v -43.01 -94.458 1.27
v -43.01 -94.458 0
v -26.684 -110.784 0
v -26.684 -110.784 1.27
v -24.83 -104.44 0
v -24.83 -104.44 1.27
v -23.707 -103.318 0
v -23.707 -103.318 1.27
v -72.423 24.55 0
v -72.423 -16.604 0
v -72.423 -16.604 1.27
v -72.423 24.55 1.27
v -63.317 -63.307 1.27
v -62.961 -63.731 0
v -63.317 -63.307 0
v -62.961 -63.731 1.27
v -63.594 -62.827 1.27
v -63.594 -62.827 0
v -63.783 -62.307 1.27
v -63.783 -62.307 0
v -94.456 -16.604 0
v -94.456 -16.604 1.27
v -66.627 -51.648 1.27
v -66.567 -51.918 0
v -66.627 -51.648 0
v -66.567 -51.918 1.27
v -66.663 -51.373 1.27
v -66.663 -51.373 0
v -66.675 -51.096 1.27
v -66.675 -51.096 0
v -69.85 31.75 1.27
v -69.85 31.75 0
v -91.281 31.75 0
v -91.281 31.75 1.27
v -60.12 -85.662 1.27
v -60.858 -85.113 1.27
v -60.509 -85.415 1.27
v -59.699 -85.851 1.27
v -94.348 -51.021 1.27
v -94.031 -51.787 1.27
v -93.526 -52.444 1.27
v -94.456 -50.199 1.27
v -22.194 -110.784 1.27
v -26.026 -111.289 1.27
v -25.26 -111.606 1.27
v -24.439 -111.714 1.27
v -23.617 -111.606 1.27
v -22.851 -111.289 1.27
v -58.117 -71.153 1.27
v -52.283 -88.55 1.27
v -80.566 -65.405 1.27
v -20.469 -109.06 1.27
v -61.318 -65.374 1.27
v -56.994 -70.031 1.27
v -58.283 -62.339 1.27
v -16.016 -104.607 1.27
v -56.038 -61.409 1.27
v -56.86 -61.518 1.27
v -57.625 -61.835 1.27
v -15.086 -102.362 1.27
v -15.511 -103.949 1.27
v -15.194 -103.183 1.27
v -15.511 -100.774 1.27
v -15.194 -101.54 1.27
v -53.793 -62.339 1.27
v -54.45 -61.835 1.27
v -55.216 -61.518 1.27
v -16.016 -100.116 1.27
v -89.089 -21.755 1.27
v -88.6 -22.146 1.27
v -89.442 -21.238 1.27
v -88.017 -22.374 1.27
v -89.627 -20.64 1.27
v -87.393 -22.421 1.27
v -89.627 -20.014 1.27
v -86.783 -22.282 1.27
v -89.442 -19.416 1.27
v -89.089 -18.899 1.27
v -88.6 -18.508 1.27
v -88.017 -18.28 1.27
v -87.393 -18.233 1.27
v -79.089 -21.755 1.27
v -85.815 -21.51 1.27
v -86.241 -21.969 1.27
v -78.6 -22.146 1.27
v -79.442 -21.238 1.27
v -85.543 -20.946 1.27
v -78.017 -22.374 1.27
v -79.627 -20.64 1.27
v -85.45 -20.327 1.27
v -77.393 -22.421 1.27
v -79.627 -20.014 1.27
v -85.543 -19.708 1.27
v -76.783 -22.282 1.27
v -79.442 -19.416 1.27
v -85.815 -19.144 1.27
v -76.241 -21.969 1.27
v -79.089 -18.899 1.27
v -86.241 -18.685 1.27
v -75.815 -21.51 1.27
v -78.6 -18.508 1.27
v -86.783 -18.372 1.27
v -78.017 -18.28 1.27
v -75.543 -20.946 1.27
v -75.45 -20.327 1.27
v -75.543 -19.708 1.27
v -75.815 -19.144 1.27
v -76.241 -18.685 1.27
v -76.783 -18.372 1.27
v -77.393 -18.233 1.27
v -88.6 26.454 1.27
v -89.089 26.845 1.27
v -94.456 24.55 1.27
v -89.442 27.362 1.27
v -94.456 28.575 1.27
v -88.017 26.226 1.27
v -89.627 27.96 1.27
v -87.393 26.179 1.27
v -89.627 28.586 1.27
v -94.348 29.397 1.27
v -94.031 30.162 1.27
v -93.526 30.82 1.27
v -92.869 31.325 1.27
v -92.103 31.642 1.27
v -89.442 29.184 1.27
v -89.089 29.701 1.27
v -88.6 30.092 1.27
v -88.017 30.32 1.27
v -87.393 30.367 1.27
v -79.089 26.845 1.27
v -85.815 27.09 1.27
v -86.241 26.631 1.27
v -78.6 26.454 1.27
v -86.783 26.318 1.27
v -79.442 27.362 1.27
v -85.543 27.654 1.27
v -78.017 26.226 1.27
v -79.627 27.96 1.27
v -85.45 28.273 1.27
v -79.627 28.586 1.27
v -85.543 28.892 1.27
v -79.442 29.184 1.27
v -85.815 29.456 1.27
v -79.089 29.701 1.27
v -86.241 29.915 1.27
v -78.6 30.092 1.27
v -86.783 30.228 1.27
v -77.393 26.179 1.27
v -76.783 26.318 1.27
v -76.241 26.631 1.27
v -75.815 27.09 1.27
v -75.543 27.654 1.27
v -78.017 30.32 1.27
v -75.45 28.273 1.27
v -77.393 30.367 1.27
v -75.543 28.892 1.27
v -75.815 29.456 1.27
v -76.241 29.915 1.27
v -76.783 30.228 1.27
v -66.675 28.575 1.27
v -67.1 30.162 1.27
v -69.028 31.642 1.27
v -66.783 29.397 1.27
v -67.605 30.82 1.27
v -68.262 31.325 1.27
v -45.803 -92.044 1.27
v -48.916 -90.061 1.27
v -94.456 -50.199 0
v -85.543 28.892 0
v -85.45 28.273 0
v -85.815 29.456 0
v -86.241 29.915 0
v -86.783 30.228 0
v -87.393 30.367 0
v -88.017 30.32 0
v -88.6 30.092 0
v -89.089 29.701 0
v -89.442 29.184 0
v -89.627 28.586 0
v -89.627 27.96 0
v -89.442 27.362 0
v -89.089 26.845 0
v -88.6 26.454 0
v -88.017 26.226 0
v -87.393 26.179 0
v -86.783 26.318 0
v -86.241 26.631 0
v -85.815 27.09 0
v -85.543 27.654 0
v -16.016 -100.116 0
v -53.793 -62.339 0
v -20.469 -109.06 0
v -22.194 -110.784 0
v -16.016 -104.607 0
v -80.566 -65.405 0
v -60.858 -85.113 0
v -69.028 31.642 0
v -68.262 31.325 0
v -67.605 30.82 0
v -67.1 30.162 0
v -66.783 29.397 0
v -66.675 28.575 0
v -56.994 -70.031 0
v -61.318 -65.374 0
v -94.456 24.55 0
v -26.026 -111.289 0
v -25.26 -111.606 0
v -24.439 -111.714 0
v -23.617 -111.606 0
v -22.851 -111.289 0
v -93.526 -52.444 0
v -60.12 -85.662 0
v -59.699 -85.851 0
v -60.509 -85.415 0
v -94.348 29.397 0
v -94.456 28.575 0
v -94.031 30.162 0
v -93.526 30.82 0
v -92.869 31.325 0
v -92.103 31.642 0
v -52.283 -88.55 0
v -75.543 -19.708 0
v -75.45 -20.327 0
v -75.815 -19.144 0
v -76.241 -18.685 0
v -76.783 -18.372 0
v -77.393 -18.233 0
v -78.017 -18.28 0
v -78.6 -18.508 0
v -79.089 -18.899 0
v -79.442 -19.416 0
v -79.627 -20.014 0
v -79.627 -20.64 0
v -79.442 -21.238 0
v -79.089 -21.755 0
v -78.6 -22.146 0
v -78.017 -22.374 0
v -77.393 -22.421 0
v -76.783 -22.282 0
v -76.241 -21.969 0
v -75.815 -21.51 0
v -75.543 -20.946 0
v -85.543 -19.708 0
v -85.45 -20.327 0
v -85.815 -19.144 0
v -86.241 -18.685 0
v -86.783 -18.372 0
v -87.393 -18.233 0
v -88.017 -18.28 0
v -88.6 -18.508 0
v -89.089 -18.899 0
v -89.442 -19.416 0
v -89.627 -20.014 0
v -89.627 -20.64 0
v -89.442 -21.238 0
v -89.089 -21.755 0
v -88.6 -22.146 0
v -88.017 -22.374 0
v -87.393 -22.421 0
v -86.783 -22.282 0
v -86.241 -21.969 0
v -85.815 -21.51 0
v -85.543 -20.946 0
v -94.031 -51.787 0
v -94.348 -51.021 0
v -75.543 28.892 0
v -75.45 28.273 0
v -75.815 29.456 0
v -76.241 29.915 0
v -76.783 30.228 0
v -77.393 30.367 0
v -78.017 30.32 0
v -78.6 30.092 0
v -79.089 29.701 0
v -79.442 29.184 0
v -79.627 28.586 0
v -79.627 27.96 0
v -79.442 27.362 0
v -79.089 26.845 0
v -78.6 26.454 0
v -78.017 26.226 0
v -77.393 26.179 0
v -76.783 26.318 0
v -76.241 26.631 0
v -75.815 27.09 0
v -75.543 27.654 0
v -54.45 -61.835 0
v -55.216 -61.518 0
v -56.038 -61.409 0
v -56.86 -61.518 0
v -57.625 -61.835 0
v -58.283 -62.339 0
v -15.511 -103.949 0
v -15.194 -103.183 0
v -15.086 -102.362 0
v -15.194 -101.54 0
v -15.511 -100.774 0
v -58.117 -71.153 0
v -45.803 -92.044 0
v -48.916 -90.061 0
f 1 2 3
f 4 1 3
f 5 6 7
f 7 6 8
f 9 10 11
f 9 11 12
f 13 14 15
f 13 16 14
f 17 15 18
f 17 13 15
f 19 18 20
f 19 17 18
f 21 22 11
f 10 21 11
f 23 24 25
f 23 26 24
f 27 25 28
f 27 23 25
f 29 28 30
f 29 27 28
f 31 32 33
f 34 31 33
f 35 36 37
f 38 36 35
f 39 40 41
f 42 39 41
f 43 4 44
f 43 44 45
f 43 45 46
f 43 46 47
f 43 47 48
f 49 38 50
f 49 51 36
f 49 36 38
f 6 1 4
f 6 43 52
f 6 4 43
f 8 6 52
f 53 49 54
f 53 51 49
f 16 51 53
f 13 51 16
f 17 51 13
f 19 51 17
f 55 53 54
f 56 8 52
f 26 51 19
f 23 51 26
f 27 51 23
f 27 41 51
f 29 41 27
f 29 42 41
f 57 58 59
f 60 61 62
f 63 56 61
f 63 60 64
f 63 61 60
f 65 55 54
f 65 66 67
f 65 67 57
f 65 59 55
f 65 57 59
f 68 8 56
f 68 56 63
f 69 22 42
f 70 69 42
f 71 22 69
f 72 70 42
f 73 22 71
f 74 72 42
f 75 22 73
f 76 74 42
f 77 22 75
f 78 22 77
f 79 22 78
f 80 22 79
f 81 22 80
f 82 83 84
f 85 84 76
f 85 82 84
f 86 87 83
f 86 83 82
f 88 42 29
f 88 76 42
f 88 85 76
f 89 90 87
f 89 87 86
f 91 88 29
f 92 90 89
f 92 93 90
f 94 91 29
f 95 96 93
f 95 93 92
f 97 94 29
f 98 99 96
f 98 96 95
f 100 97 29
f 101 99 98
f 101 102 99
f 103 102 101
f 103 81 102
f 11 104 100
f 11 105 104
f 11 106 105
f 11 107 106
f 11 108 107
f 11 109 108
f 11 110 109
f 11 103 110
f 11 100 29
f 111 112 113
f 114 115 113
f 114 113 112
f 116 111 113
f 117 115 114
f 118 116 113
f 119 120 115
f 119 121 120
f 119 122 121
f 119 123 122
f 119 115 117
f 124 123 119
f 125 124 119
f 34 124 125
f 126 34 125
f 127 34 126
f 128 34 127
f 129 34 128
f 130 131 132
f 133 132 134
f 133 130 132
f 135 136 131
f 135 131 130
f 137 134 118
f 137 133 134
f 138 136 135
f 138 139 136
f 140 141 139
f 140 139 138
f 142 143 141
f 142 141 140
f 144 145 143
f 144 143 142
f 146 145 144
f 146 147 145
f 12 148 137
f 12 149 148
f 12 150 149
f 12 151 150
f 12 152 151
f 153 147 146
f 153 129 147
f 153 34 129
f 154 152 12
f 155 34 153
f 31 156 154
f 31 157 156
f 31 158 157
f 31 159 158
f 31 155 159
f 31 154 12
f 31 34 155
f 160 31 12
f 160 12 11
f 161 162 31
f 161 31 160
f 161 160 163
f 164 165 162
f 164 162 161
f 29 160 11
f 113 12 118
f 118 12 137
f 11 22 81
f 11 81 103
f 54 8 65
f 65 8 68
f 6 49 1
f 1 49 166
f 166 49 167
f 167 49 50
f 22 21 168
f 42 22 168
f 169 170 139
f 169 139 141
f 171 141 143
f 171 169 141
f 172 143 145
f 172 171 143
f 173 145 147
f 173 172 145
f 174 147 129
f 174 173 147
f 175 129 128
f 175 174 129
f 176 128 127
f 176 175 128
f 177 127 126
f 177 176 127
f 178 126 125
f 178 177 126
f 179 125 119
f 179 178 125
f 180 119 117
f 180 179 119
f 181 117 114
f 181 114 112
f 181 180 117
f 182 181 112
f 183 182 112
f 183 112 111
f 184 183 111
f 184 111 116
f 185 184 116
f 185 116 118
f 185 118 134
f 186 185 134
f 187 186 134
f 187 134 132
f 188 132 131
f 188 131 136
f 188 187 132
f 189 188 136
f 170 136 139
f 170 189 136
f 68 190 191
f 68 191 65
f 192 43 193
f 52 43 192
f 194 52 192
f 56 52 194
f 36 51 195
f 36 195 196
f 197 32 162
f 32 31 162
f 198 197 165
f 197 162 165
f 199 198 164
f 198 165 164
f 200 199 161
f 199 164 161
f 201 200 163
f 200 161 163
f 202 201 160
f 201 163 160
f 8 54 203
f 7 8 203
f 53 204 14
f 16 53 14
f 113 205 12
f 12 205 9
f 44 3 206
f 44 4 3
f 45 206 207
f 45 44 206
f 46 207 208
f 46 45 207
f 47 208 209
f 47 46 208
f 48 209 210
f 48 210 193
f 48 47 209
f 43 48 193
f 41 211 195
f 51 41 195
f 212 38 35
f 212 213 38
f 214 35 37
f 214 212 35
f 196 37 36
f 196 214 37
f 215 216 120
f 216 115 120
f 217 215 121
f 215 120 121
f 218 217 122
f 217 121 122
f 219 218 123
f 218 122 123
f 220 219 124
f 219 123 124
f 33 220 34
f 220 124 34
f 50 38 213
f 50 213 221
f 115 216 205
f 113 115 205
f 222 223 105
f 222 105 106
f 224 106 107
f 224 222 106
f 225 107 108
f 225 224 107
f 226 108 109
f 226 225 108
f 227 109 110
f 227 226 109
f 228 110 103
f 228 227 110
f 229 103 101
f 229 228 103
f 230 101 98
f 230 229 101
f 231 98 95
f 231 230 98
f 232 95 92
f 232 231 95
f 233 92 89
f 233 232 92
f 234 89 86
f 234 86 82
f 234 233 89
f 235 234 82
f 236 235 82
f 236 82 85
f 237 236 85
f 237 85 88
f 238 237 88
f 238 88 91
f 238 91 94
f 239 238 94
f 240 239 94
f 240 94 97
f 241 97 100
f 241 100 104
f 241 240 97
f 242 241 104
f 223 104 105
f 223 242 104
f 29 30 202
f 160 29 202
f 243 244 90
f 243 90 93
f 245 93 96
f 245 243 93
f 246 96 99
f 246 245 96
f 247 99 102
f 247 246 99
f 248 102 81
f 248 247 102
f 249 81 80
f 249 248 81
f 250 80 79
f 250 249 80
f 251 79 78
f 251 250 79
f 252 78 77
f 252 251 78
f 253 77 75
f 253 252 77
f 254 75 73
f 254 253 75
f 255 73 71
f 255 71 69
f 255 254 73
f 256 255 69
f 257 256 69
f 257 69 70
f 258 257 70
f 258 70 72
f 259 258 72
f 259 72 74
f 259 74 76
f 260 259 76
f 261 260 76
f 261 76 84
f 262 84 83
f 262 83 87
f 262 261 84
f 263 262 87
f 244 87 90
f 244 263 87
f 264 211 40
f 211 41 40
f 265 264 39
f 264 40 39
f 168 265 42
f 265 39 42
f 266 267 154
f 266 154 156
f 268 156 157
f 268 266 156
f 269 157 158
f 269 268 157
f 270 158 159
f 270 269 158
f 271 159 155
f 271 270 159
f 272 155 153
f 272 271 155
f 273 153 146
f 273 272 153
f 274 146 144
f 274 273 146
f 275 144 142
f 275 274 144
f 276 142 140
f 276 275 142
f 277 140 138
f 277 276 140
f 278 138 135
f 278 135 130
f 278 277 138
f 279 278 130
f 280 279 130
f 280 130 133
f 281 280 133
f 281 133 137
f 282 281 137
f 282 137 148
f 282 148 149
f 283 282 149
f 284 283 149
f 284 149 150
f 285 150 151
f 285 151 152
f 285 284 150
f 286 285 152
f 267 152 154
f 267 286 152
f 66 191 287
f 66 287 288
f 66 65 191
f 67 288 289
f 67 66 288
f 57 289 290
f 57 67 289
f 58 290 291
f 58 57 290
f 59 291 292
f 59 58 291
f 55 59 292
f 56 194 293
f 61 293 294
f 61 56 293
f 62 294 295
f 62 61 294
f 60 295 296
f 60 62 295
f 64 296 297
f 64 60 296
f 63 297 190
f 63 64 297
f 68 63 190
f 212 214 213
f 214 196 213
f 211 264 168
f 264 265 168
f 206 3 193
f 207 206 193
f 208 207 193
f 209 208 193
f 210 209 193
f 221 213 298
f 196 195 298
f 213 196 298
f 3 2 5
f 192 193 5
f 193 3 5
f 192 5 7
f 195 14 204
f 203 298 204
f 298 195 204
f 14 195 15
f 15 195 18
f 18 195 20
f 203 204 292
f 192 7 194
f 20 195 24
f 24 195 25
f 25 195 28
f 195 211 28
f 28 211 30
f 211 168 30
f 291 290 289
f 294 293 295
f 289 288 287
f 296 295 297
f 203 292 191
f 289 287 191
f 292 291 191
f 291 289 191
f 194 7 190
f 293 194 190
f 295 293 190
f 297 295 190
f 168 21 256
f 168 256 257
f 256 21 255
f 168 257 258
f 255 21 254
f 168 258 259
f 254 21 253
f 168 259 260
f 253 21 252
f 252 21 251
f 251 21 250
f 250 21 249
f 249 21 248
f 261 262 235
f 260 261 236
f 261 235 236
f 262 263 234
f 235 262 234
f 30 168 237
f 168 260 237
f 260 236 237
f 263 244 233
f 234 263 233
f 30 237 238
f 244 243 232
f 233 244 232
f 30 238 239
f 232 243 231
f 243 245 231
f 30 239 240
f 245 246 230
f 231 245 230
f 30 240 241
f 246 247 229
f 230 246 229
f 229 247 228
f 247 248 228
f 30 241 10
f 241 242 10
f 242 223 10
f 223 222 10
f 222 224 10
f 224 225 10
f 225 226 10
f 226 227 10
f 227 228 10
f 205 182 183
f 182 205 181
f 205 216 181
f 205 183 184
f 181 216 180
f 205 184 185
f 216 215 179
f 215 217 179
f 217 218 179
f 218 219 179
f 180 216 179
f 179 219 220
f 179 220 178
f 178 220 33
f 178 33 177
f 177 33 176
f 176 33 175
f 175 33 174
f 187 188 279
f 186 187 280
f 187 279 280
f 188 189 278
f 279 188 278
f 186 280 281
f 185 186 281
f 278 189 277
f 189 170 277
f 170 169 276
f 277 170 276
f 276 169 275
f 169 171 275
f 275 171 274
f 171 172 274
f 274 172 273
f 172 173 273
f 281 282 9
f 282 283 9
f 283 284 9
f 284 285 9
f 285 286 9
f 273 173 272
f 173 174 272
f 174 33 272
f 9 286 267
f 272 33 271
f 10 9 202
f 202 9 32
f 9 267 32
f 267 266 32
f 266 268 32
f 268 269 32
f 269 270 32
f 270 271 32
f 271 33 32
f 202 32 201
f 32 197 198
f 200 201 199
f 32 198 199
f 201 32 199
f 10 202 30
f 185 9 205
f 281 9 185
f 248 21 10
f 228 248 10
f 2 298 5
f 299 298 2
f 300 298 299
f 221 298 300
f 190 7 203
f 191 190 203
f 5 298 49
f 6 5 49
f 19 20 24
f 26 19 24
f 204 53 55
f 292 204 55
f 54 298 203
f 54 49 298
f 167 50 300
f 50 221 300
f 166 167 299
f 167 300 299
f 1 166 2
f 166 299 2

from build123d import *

# Parameters (mm, degrees)
SKETCH1_R                    = 2.099999991
BASE_FLANGE1_DEPTH           = 1.27
EDGE_FLANGE2_STRIP_W         = 6.5532
EDGE_FLANGE2_STRIP_H         = 1.27
EDGE_FLANGE2_STRIP_CUT_DEPTH = 59.775021713
EDGE_FLANGE2_DEPTH           = 59.775021713
SKETCH14_W                   = 1.779250061
SKETCH14_H                   = 41.153999988
CUT_EXTRUDE1_DEPTH           = 148.532360138
CUT_EXTRUDE_THIN2_START      = 2.868175785
CUT_EXTRUDE_THIN2_DEPTH      = 59.775021713
CUT_EXTRUDE_THIN2_START_2    = 9.218175785
CUT_EXTRUDE_THIN2_2_DEPTH    = 47.075021713
CUT_EXTRUDE_THIN2_3_DEPTH    = 59.775021713
CUT_EXTRUDE_THIN2_4_DEPTH    = 6.35
CUT_EXTRUDE_THIN2_START_3    = 56.293197498
CUT_EXTRUDE_THIN2_5_DEPTH    = 6.35
BOSS_EXTRUDE1_DEPTH          = 1.27
FILLET1_R                    = 25.4
FILLET2_R                    = 3.175


# Read off the part's stored shape, not the designer's step: Cut-Extrude-Thin2
# Sheet-metal steps are written as plain solids
with BuildPart() as part:
    # Sketch1 → Base-Flange1 (new body)
    with BuildSketch(Plane.XY):
        Polygon((-24.438645943, -113.029505435), (-19.05049227, -107.641351762), (-63.562879499, -63.128964533), (-66.675, -51.514372705), (-66.675, 31.75), (-94.45625, 31.75), (-94.45625, -51.514372705), (-80.565625, -65.404997705), (-68.951033172, -68.517118206), align=None)
        with Locations((-87.550000033, 28.272999969)):
            Circle(SKETCH1_R, mode=Mode.SUBTRACT)
        with Locations((-77.549999967, 28.272999969)):
            Circle(SKETCH1_R, mode=Mode.SUBTRACT)
        with Locations((-87.550000033, -20.327000113)):
            Circle(SKETCH1_R, mode=Mode.SUBTRACT)
        with Locations((-77.549999967, -20.327000113)):
            Circle(SKETCH1_R, mode=Mode.SUBTRACT)
        Polygon((-92.676999939, -16.604000066), (-83.05, -16.604000066), (-82.05, -16.604000066), (-72.423000061, -16.604000066), (-72.423000061, 24.549999922), (-82.05, 24.549999922), (-83.05, 24.549999922), (-92.676999939, 24.549999922), align=None, mode=Mode.SUBTRACT)
    extrude(amount=BASE_FLANGE1_DEPTH)

    # Edge-Flange2 strip (across the edge) → Edge-Flange2 strip cut (cut)
    with BuildSketch(Plane(origin=(-19.05049227, -107.641351762, 1.27), x_dir=(-0.707106781186551, -0.707106781186544, 3.4914813388431334e-15), z_dir=(-0.707106781186544, 0.707106781186551, 0))):
        with Locations((-1.27, -0.635)):
            Rectangle(EDGE_FLANGE2_STRIP_W, EDGE_FLANGE2_STRIP_H)
    extrude(amount=EDGE_FLANGE2_STRIP_CUT_DEPTH, mode=Mode.SUBTRACT)

    # Edge-Flange2 section (across the edge) → Edge-Flange2 (add)
    with BuildSketch(Plane(origin=(-19.05049227, -107.641351762, 1.27), x_dir=(-0.707106781186551, -0.707106781186544, 3.4914813388431334e-15), z_dir=(-0.707106781186544, 0.707106781186551, 0))):
        with BuildLine():
            Line((0, 0.7366), (0, 8.255))
            Line((0, 8.255), (1.27, 8.255))
            Line((1.27, 8.255), (1.27, 0.7366))
            ThreePointArc((1.27, 0.7366), (1.485745145, 0.215745145), (2.0066, 0))
            Line((2.0066, 0), (2.0066, -1.27))
            ThreePointArc((2.0066, -1.27), (0.587719533, -0.682280467), (0, 0.7366))
        make_face()
    extrude(amount=EDGE_FLANGE2_DEPTH)

    # Sketch14 → Cut-Extrude1 (cut, through all)
    with BuildSketch(Plane.XY.offset(1.27)):
        with Locations((-93.56662497, 3.972999928)):
            Rectangle(SKETCH14_W, SKETCH14_H)
    extrude(amount=-CUT_EXTRUDE1_DEPTH, mode=Mode.SUBTRACT)

    # Cut-Extrude-Thin2 outline → Cut-Extrude-Thin2 (cut)
    with BuildSketch(Plane(origin=(0, 0, 0), x_dir=(0.7071067811865438, 0.7071067811865512, 0), z_dir=(0.7071067811865511, -0.7071067811865441, 0)).offset(CUT_EXTRUDE_THIN2_START)):
        with BuildLine():
            Line((-91.591262036, 1.27), (-89.724750852, 1.27))
            ThreePointArc((-89.724750852, 1.27), (-89.619995324, 1.631698534), (-89.584662036, 2.0066))
            Line((-89.584662036, 2.0066), (-89.584662036, 9.525))
            Line((-89.584662036, 9.525), (-90.854662036, 9.525))
            Line((-90.854662036, 9.525), (-90.854662036, 2.0066))
            ThreePointArc((-90.854662036, 2.0066), (-91.070407181, 1.485745145), (-91.591262036, 1.27))
        make_face()
    extrude(amount=CUT_EXTRUDE_THIN2_DEPTH, mode=Mode.SUBTRACT)

    # Cut-Extrude-Thin2 2 outline → Cut-Extrude-Thin2 2 (cut)
    with BuildSketch(Plane(origin=(0, 0, 0), x_dir=(0.7071067811865438, 0.7071067811865512, 0), z_dir=(0.7071067811865511, -0.7071067811865441, 0)).offset(CUT_EXTRUDE_THIN2_START_2)):
        with BuildLine():
            ThreePointArc((-91.407505482, 0.008431566), (-90.480448103, 0.335511742), (-89.820005482, 1.063682305))
            Line((-89.820005482, 1.063682305), (-89.820005482, 1.27))
            Line((-89.820005482, 1.27), (-91.407505482, 1.27))
            Line((-91.407505482, 1.27), (-91.407505482, 0.008431566))
        make_face()
    extrude(amount=CUT_EXTRUDE_THIN2_2_DEPTH, mode=Mode.SUBTRACT)

    # Cut-Extrude-Thin2 3 outline → Cut-Extrude-Thin2 3 (add)
    with BuildSketch(Plane(origin=(0, 0, 0), x_dir=(0.7071067811865438, 0.7071067811865512, 0), z_dir=(0.7071067811865511, -0.7071067811865441, 0)).offset(CUT_EXTRUDE_THIN2_START)):
        with BuildLine():
            Line((-89.820005482, 0), (-82.117848928, 0))
            Line((-82.117848928, 0), (-82.117848928, 1.27))
            Line((-82.117848928, 1.27), (-89.724750852, 1.27))
            ThreePointArc((-89.724750852, 1.27), (-89.769455165, 1.165491634), (-89.820005482, 1.063682305))
            Line((-89.820005482, 1.063682305), (-89.820005482, 0))
        make_face()
        with BuildLine():
            Line((-91.591262036, 0), (-91.407505482, 0))
            Line((-91.407505482, 0), (-91.407505482, 0.008431566))
            ThreePointArc((-91.407505482, 0.008431566), (-91.49928709, 0.002109), (-91.591262036, 0))
        make_face()
    extrude(amount=CUT_EXTRUDE_THIN2_3_DEPTH)

    # Cut-Extrude-Thin2 4 outline → Cut-Extrude-Thin2 4 (add)
    with BuildSketch(Plane(origin=(0, 0, 0), x_dir=(0.7071067811865438, 0.7071067811865512, 0), z_dir=(0.7071067811865511, -0.7071067811865441, 0)).offset(CUT_EXTRUDE_THIN2_START)):
        with BuildLine():
            Line((-91.407505482, 0), (-89.820005482, 0))
            Line((-89.820005482, 0), (-89.820005482, 1.063682305))
            ThreePointArc((-89.820005482, 1.063682305), (-90.480448103, 0.335511742), (-91.407505482, 0.008431566))
            Line((-91.407505482, 0.008431566), (-91.407505482, 0))
        make_face()
    extrude(amount=CUT_EXTRUDE_THIN2_4_DEPTH)

    # Cut-Extrude-Thin2 5 outline → Cut-Extrude-Thin2 5 (add)
    with BuildSketch(Plane(origin=(0, 0, 0), x_dir=(0.7071067811865438, 0.7071067811865512, 0), z_dir=(0.7071067811865511, -0.7071067811865441, 0)).offset(CUT_EXTRUDE_THIN2_START_3)):
        with BuildLine():
            Line((-91.407505482, 0), (-89.820005482, 0))
            Line((-89.820005482, 0), (-89.820005482, 1.063682305))
            ThreePointArc((-89.820005482, 1.063682305), (-90.480448103, 0.335511742), (-91.407505482, 0.008431566))
            Line((-91.407505482, 0.008431566), (-91.407505482, 0))
        make_face()
    extrude(amount=CUT_EXTRUDE_THIN2_5_DEPTH)

    # Sketch17 → Boss-Extrude1 (add)
    with BuildSketch(Plane.XY.offset(1.27)):
        Polygon((-68.951033172, -68.517118206), (-80.565625, -65.404997705), (-60.360048728, -85.610573978), (-46.992008762, -90.476142615), align=None)
    extrude(amount=-BOSS_EXTRUDE1_DEPTH)

    # Fillet1
    fillet1_edges = [part.edges().sort_by_distance(p)[0] for p in [
        (-46.992008762, -90.476142615, 0.635),
    ]]
    fillet(fillet1_edges, radius=FILLET1_R)

    # Fillet2
    fillet2_edges = [part.edges().sort_by_distance(p)[0] for p in [
        (-94.45625, 31.75, 0.635),
        (-66.675, 31.75, 0.635),
        (-66.675, -51.514372705, 0.635),
        (-63.562879499, -63.128964533, 0.635),
        (-94.45625, -51.514372705, 0.635),
        (-24.438645943, -113.029505435, 0.635),
        (-60.360048728, -85.610573978, 0.635),
        (-13.770658087, -102.361517579, 0.635),
        (-56.037981286, -60.094194381, 0.635),
    ]]
    fillet(fillet2_edges, radius=FILLET2_R)


solid = part.part
